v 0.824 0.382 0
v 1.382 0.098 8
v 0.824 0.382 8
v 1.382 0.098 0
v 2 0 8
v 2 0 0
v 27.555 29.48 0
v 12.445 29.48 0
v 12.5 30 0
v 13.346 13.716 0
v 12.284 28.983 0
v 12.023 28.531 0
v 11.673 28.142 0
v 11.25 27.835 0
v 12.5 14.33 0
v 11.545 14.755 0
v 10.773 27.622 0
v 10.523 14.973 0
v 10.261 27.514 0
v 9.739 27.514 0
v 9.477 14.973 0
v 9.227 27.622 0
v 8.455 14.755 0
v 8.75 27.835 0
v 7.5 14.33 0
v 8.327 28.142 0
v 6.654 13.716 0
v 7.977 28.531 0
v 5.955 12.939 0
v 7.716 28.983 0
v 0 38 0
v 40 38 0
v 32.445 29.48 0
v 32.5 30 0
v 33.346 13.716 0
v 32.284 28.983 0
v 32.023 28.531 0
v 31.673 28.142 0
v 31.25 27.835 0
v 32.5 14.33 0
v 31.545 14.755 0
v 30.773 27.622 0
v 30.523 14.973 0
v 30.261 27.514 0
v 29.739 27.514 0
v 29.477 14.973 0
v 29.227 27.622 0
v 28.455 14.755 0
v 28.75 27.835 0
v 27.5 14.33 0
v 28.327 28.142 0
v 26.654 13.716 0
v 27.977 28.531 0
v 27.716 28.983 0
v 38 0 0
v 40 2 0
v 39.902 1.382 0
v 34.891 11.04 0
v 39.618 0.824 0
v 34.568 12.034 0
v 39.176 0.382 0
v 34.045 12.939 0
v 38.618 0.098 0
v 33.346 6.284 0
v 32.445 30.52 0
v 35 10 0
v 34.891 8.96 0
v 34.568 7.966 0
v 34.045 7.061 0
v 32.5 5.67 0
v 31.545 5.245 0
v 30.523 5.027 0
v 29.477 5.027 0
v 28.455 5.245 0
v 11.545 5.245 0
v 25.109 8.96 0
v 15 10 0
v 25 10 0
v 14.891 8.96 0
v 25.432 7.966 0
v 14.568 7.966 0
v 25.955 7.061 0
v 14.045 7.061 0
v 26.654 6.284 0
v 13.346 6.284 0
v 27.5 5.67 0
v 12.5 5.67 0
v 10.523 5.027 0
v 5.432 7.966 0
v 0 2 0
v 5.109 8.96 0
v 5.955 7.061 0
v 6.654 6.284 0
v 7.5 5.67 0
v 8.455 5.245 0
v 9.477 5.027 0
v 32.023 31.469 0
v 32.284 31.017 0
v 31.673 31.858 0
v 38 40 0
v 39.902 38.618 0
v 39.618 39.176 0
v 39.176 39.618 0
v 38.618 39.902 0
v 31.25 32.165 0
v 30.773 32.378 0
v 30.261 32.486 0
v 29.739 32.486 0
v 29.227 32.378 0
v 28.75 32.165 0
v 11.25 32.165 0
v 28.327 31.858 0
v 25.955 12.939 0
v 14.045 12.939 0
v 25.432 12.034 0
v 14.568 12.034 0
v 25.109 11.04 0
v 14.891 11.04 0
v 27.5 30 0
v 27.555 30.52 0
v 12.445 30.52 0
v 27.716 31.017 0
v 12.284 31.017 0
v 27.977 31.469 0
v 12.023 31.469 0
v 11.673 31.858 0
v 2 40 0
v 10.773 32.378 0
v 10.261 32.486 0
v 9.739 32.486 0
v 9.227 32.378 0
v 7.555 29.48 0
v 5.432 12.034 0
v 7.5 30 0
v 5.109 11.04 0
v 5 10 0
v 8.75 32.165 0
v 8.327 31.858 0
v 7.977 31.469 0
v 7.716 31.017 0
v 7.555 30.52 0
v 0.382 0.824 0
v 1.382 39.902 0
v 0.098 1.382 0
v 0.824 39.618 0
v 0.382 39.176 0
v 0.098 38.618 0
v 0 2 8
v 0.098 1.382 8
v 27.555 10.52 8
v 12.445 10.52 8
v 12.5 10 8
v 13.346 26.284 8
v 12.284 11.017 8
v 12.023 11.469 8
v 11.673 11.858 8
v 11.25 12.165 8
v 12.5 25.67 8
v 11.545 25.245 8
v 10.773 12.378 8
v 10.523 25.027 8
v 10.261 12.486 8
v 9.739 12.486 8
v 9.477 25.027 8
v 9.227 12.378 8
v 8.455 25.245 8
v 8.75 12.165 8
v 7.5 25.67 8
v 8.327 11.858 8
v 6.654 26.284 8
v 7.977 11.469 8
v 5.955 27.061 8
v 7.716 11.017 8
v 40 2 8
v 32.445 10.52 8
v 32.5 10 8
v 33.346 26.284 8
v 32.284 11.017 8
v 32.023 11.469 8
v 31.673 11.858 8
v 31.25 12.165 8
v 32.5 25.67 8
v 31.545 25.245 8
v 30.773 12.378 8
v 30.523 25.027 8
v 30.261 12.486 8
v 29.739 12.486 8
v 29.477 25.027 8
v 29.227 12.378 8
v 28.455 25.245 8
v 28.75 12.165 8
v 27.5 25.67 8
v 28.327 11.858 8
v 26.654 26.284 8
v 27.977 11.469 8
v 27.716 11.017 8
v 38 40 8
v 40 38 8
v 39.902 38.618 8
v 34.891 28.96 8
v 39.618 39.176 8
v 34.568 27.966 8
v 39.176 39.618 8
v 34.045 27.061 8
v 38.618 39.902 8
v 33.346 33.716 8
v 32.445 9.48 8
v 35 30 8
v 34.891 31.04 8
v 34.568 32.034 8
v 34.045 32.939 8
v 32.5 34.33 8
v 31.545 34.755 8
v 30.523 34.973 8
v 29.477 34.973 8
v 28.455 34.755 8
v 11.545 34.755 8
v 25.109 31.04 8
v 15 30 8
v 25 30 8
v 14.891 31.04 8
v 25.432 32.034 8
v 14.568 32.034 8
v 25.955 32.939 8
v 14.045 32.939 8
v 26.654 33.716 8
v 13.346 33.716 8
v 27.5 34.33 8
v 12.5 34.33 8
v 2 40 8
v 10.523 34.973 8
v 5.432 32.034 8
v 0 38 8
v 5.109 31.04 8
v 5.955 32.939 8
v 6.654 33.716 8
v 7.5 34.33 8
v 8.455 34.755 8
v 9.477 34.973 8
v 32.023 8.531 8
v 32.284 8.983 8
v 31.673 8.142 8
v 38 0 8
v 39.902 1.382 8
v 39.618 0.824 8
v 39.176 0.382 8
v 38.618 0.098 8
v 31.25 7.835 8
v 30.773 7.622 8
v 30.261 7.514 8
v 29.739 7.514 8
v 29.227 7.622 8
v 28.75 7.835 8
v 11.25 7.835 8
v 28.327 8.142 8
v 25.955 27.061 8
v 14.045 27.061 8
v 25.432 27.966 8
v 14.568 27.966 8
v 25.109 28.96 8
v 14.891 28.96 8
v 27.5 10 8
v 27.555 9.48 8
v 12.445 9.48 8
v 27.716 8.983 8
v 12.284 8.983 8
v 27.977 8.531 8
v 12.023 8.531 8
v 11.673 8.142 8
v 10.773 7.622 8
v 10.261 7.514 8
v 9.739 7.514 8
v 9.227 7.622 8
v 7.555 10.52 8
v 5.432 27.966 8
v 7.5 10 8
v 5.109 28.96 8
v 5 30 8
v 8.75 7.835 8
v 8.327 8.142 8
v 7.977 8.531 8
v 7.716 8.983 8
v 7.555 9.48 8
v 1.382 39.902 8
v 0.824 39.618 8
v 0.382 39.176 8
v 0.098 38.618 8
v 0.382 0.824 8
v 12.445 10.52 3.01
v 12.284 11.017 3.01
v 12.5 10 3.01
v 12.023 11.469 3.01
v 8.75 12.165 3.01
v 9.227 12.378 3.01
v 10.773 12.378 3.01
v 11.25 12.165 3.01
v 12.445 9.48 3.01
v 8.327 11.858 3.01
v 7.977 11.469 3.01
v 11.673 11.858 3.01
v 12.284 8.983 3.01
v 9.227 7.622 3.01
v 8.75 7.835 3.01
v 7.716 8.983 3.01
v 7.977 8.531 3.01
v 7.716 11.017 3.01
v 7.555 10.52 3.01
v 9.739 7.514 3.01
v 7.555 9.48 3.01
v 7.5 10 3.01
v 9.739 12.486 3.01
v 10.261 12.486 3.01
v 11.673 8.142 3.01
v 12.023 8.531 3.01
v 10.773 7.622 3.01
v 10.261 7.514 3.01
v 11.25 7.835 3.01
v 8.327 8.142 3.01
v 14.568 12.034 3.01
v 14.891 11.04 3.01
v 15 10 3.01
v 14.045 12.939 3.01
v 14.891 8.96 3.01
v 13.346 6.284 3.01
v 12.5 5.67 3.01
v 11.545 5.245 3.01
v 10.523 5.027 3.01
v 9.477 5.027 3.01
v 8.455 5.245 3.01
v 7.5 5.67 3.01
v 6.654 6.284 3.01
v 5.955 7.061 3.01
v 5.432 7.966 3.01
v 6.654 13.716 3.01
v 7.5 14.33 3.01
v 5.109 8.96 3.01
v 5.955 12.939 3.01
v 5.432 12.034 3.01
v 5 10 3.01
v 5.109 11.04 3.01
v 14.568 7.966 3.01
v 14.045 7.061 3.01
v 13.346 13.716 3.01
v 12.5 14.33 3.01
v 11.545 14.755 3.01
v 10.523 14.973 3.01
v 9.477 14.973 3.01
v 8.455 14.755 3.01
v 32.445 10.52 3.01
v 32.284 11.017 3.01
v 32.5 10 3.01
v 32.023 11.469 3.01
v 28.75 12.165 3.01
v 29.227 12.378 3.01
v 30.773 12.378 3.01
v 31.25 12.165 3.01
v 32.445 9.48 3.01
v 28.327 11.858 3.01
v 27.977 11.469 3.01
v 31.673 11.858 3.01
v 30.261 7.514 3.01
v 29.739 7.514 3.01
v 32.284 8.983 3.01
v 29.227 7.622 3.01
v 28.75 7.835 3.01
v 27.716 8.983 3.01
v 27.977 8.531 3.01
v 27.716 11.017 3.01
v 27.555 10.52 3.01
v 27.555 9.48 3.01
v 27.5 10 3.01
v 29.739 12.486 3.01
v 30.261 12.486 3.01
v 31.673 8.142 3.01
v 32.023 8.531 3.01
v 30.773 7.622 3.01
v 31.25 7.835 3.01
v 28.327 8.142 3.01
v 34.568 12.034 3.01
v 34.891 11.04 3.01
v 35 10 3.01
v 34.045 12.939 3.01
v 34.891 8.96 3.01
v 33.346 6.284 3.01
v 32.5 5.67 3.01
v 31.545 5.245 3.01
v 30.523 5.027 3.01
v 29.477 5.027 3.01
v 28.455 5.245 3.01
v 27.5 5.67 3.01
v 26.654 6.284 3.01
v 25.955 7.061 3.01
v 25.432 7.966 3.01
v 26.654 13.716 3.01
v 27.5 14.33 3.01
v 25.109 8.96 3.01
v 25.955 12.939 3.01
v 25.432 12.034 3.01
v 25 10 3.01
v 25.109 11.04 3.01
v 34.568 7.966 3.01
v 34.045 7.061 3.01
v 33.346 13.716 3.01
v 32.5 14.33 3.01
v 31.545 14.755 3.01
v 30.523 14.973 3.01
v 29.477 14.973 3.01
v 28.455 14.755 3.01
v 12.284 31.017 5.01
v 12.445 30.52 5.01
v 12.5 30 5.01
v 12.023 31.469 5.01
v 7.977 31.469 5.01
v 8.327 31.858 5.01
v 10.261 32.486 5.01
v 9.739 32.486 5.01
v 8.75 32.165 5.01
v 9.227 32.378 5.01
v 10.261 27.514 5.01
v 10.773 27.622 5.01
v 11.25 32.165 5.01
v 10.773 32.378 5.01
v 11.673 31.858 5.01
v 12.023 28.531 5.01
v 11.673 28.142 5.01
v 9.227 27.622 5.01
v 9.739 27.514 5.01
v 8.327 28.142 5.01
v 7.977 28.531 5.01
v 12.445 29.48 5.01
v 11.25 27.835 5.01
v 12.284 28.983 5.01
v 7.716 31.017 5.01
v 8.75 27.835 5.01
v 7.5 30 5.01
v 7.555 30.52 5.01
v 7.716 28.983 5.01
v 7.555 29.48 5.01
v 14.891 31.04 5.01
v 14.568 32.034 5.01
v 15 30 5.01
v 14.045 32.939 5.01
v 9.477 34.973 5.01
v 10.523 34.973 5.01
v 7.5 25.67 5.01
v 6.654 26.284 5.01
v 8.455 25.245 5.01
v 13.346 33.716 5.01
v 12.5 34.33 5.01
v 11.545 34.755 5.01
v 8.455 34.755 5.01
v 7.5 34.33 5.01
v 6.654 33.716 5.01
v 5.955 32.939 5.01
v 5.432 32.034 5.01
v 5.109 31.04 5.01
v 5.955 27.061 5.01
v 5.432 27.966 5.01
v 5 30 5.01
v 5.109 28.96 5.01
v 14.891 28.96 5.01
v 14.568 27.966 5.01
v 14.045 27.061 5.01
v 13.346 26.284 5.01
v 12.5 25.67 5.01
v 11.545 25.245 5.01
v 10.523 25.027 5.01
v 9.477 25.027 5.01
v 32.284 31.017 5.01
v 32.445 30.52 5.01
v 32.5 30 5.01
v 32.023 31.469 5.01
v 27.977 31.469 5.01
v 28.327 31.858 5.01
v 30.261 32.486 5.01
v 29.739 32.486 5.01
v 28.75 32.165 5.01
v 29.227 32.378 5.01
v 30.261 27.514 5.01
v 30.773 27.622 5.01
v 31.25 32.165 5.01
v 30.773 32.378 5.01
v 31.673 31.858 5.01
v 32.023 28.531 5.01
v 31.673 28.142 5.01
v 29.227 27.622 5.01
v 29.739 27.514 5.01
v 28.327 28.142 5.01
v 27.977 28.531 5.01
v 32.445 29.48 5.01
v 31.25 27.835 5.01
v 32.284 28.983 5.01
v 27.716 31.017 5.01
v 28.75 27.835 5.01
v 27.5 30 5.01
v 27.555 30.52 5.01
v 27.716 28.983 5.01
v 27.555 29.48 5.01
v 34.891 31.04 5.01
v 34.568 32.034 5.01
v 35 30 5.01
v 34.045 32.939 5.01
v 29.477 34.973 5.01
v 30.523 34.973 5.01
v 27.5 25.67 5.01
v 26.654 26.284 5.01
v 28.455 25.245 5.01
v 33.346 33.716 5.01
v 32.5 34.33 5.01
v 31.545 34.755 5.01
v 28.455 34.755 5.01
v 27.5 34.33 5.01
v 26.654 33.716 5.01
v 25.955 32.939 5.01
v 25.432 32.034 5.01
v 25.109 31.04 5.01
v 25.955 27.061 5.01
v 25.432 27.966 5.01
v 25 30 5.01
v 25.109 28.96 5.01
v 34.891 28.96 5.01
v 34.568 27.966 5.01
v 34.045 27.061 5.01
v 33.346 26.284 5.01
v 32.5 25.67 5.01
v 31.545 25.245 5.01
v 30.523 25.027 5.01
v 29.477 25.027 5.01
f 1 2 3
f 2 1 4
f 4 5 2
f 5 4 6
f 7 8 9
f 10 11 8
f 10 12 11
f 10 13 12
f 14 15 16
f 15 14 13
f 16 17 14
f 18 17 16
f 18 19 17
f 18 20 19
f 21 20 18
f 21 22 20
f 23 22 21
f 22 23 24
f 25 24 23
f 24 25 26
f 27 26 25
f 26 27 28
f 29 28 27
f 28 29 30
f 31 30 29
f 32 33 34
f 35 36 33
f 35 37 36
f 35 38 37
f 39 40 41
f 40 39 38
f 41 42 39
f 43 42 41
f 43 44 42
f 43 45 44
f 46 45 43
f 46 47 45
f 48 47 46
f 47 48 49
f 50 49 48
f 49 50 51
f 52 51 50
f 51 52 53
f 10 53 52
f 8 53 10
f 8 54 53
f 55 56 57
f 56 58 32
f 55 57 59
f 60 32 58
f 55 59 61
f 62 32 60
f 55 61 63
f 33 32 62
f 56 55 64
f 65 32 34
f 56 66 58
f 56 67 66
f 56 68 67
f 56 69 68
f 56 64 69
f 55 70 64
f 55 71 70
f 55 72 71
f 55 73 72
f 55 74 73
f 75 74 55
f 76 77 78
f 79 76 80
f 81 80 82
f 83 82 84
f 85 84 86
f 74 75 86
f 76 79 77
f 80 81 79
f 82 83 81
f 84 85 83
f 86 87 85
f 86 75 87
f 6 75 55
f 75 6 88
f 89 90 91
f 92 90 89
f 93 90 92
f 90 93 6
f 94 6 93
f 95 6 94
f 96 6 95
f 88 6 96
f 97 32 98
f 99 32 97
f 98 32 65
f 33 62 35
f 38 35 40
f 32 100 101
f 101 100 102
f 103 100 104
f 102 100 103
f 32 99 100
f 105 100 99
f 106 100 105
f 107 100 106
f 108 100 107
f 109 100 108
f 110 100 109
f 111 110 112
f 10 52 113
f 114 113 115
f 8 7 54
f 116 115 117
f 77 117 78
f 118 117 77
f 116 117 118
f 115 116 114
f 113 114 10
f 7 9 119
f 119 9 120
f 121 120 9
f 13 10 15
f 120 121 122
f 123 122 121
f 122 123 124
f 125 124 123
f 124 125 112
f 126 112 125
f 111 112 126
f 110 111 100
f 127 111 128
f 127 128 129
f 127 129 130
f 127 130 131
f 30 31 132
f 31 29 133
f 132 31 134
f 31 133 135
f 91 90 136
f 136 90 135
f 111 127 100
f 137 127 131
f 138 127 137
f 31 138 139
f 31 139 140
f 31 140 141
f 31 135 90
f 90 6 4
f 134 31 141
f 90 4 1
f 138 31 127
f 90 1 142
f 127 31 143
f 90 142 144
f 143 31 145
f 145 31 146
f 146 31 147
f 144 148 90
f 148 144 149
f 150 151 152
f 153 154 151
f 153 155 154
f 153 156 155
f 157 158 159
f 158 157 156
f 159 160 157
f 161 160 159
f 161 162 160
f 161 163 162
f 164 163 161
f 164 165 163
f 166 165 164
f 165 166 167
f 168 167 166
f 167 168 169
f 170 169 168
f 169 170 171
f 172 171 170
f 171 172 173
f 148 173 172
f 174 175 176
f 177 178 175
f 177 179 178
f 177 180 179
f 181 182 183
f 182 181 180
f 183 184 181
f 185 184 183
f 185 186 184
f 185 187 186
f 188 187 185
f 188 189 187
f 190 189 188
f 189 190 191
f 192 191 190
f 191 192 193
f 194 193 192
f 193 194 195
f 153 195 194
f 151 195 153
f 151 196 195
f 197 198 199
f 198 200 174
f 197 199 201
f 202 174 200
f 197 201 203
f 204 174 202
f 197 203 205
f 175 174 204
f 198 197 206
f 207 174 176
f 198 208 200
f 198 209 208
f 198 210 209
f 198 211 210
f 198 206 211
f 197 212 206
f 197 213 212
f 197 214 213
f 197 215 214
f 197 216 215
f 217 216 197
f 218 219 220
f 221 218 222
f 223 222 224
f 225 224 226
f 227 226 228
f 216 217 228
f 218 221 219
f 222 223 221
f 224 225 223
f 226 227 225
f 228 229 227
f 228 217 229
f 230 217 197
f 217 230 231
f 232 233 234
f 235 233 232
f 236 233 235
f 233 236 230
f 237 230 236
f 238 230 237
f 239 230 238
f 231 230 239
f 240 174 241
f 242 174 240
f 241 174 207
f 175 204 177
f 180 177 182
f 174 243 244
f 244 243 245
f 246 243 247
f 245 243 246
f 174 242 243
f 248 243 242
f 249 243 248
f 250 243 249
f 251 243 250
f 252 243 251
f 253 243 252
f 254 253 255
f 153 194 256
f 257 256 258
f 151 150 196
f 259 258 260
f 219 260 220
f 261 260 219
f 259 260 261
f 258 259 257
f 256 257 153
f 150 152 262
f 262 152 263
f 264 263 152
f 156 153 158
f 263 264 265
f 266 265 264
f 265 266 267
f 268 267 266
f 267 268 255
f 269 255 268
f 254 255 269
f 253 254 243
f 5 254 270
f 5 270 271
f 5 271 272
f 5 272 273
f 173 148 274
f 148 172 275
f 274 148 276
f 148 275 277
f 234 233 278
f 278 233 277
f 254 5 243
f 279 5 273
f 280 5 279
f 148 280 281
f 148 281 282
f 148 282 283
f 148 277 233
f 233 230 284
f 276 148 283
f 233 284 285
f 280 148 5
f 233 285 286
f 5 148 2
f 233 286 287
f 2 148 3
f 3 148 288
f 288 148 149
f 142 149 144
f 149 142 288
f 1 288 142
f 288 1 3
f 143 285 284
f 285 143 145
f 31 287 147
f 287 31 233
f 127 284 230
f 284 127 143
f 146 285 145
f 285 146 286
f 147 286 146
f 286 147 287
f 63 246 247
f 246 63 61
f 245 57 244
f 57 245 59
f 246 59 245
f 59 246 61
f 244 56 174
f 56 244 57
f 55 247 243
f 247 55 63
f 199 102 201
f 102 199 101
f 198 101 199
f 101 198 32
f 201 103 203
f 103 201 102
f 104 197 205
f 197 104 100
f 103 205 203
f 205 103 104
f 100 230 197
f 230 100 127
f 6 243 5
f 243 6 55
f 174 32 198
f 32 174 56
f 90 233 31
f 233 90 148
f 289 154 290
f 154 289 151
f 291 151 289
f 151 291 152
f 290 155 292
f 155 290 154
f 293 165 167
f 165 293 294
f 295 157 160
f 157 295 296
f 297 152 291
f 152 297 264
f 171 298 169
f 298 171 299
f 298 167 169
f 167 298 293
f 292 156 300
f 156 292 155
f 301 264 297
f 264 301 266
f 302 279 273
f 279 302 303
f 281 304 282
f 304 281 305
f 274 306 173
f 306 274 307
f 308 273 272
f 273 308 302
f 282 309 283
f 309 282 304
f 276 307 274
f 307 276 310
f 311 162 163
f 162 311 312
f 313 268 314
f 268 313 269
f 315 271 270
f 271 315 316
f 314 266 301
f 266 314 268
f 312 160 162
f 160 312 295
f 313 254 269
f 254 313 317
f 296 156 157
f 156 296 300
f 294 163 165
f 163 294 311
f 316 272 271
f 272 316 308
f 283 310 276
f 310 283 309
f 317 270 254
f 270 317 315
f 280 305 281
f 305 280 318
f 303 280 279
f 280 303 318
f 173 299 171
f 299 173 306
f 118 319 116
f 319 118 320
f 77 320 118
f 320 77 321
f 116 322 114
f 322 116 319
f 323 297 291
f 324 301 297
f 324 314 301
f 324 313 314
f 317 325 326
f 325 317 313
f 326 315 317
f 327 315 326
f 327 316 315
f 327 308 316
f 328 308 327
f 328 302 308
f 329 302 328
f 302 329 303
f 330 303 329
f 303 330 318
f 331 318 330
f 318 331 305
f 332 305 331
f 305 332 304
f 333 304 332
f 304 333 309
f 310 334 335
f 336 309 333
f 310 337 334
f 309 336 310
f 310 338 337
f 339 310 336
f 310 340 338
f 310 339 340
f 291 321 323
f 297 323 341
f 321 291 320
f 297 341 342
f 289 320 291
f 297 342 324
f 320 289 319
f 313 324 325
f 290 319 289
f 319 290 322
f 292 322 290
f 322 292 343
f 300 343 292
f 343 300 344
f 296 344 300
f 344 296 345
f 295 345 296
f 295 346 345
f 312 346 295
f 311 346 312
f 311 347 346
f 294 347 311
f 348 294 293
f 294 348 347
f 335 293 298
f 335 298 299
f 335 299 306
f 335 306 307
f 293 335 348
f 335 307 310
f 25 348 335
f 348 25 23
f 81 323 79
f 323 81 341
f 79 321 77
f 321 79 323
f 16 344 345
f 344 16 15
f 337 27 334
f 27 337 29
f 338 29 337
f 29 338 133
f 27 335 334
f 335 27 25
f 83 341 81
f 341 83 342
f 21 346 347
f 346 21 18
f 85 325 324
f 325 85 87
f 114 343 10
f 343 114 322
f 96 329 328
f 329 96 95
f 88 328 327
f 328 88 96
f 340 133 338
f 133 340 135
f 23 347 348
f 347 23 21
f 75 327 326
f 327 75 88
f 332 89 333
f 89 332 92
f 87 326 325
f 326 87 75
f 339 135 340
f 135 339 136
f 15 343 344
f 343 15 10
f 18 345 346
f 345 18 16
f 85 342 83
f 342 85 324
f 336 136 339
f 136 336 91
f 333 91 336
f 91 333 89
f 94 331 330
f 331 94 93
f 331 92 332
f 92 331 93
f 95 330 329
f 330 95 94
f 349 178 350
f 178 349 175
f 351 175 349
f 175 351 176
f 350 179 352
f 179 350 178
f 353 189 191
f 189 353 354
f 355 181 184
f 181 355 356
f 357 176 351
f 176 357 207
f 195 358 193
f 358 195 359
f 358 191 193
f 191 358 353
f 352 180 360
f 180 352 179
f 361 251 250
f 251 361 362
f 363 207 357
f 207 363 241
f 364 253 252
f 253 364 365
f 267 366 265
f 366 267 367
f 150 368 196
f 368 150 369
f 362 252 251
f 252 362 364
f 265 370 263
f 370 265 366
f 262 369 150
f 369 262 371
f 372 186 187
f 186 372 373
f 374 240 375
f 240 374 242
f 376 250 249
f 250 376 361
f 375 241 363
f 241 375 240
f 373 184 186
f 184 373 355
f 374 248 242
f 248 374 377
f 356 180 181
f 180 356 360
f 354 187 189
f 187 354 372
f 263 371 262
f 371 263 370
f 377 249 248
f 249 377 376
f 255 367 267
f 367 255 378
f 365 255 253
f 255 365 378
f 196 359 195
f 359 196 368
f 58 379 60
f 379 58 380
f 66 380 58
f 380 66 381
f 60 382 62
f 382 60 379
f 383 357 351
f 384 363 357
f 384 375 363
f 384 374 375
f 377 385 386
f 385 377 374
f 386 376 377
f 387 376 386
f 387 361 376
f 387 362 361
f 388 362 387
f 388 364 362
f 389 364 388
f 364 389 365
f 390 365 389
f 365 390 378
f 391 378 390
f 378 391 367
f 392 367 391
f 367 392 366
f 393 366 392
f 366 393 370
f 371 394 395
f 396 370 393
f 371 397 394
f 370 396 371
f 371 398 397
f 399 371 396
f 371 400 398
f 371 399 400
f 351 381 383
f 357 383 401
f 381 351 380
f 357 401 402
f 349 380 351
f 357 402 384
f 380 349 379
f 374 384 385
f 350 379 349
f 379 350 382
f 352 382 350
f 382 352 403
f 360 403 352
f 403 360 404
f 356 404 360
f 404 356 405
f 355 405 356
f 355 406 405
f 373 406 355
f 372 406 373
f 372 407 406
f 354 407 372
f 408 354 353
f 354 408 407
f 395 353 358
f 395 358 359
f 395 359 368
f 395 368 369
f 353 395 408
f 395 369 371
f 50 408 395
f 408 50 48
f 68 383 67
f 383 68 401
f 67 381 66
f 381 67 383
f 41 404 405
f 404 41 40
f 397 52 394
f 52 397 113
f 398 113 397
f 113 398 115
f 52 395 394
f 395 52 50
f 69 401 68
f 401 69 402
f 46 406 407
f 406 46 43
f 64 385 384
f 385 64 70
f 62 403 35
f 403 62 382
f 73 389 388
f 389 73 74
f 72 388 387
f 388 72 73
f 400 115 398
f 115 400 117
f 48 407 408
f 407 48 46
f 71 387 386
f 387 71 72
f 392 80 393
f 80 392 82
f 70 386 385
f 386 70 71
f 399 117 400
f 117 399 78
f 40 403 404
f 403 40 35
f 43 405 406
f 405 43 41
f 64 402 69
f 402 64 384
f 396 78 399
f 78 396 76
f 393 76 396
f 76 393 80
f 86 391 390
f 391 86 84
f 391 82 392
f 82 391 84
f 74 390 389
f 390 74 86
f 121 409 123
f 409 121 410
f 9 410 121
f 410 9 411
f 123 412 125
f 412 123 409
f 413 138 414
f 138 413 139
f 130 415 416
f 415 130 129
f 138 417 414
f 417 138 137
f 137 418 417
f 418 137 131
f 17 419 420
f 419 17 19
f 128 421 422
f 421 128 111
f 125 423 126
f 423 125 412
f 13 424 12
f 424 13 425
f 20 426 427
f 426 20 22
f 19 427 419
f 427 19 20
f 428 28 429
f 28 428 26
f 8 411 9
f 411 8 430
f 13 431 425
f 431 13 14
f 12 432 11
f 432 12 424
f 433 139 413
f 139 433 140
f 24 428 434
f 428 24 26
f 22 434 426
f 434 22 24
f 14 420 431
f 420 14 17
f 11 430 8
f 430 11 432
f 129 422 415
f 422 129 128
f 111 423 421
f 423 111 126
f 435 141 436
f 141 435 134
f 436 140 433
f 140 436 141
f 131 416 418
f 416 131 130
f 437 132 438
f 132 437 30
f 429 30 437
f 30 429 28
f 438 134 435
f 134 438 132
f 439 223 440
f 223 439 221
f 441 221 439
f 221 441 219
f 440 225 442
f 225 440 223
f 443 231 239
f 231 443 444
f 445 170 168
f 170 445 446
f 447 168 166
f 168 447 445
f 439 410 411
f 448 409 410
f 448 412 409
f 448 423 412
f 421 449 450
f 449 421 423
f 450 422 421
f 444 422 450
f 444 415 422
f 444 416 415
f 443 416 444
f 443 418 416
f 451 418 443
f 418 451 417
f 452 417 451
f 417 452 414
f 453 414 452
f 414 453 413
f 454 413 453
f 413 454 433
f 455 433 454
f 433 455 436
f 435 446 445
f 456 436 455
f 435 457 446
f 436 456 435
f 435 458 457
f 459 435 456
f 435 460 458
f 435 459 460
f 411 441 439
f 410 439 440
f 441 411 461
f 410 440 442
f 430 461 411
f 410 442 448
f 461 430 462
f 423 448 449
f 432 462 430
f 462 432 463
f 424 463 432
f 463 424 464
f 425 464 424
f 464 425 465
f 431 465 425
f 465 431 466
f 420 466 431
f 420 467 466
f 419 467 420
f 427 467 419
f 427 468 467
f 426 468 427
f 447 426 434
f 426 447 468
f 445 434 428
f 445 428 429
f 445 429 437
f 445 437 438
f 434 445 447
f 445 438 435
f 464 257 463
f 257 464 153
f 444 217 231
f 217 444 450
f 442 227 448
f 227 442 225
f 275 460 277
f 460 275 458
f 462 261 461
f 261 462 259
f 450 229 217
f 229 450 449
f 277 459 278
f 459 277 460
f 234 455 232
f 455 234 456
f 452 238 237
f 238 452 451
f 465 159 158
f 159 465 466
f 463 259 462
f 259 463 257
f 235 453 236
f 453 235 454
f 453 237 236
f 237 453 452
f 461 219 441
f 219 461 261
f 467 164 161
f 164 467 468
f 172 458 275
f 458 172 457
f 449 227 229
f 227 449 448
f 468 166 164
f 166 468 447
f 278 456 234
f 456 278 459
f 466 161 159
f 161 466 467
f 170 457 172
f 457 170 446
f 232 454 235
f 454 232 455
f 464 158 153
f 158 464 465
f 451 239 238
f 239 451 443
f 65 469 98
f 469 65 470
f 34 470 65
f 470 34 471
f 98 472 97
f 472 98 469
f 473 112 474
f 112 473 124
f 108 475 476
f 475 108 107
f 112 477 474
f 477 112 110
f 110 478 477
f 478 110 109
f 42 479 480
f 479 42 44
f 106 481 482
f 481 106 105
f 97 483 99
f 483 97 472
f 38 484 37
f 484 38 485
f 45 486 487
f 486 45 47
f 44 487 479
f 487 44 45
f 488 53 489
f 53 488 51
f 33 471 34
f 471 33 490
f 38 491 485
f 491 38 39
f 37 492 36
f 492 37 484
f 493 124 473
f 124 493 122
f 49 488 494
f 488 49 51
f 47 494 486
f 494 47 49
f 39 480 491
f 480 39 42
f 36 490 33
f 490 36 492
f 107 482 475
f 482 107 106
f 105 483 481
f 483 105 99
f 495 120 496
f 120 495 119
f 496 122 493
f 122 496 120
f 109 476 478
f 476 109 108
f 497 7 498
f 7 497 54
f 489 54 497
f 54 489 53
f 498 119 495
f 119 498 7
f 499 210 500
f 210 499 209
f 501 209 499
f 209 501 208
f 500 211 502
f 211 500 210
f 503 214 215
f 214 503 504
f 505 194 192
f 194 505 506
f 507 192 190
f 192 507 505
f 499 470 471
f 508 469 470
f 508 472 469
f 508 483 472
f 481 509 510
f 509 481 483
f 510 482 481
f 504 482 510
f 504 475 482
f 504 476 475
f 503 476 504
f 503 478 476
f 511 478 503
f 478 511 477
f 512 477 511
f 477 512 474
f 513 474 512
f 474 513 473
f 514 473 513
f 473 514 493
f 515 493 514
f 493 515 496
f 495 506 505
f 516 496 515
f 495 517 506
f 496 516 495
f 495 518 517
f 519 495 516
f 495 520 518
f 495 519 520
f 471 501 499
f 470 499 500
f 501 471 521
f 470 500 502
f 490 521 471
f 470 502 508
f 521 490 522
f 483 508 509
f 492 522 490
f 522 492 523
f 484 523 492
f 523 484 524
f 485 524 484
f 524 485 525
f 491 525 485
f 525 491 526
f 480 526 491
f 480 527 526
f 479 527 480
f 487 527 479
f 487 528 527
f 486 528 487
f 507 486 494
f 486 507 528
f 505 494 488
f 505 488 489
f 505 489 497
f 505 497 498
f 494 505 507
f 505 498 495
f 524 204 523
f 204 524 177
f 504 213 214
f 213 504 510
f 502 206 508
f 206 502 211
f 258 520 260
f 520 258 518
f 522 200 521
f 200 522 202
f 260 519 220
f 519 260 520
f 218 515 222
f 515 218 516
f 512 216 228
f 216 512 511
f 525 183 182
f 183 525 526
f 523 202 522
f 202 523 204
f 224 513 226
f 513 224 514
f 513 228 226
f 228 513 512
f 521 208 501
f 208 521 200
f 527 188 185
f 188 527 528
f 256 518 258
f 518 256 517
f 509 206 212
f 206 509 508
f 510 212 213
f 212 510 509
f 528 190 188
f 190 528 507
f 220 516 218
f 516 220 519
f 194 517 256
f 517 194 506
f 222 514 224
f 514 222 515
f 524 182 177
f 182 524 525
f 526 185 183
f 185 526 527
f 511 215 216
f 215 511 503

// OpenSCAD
// v1
// Pour raccorder 2 V-slots
// arrondir les angles
// Enlever 1 mm sur les bords pour éviter les frottements.
// Montage pour axe Z.

include <./MCAD/boxes.scad>
// exemple !
// roundedBox([20, 30, 40], 2, true);
A_x = 40;
B_y = 40;

edge = 0 ; // enlever cette valeur des bords.
epp = 8 ;

dia = 5 ;  // diameter of holes
eps = 0.01 ; 

contre_trou_hauteur = 3; 

module connector(A, B){
    difference() {
    // cube([A_x, B_y, epp]);
        translate([A/2, B/2, epp/2])
    roundedBox([A - (2* edge), B -(2 * edge), epp], 2, true, $fn=20);
    {
        // holes on X axis
        for (i = [ 0 : 2 ]) {
          translate([10 +  i*20, 10, 0-eps]){
            cylinder(r=dia/2, h=10 + 2*eps, $fn = 30);
            cylinder(r=5, h=3 + 2*eps, $fn = 30);
              };
          };

        for (j = [ 0 : 2 ]) {
          translate([10 +  j*20, 30, 0-eps])
            cylinder(r=dia/2, h=10 + 2*eps, $fn = 30);
           
          translate([10 +  j*20, 30, epp - contre_trou_hauteur + eps])
           cylinder(r=5, h=contre_trou_hauteur + 2*eps, $fn = 30); 
          };
          
    }
    }
}

module narrow_connector(){
    connector(A_x, B_y); 
};

narrow_connector(); 


// connector();
